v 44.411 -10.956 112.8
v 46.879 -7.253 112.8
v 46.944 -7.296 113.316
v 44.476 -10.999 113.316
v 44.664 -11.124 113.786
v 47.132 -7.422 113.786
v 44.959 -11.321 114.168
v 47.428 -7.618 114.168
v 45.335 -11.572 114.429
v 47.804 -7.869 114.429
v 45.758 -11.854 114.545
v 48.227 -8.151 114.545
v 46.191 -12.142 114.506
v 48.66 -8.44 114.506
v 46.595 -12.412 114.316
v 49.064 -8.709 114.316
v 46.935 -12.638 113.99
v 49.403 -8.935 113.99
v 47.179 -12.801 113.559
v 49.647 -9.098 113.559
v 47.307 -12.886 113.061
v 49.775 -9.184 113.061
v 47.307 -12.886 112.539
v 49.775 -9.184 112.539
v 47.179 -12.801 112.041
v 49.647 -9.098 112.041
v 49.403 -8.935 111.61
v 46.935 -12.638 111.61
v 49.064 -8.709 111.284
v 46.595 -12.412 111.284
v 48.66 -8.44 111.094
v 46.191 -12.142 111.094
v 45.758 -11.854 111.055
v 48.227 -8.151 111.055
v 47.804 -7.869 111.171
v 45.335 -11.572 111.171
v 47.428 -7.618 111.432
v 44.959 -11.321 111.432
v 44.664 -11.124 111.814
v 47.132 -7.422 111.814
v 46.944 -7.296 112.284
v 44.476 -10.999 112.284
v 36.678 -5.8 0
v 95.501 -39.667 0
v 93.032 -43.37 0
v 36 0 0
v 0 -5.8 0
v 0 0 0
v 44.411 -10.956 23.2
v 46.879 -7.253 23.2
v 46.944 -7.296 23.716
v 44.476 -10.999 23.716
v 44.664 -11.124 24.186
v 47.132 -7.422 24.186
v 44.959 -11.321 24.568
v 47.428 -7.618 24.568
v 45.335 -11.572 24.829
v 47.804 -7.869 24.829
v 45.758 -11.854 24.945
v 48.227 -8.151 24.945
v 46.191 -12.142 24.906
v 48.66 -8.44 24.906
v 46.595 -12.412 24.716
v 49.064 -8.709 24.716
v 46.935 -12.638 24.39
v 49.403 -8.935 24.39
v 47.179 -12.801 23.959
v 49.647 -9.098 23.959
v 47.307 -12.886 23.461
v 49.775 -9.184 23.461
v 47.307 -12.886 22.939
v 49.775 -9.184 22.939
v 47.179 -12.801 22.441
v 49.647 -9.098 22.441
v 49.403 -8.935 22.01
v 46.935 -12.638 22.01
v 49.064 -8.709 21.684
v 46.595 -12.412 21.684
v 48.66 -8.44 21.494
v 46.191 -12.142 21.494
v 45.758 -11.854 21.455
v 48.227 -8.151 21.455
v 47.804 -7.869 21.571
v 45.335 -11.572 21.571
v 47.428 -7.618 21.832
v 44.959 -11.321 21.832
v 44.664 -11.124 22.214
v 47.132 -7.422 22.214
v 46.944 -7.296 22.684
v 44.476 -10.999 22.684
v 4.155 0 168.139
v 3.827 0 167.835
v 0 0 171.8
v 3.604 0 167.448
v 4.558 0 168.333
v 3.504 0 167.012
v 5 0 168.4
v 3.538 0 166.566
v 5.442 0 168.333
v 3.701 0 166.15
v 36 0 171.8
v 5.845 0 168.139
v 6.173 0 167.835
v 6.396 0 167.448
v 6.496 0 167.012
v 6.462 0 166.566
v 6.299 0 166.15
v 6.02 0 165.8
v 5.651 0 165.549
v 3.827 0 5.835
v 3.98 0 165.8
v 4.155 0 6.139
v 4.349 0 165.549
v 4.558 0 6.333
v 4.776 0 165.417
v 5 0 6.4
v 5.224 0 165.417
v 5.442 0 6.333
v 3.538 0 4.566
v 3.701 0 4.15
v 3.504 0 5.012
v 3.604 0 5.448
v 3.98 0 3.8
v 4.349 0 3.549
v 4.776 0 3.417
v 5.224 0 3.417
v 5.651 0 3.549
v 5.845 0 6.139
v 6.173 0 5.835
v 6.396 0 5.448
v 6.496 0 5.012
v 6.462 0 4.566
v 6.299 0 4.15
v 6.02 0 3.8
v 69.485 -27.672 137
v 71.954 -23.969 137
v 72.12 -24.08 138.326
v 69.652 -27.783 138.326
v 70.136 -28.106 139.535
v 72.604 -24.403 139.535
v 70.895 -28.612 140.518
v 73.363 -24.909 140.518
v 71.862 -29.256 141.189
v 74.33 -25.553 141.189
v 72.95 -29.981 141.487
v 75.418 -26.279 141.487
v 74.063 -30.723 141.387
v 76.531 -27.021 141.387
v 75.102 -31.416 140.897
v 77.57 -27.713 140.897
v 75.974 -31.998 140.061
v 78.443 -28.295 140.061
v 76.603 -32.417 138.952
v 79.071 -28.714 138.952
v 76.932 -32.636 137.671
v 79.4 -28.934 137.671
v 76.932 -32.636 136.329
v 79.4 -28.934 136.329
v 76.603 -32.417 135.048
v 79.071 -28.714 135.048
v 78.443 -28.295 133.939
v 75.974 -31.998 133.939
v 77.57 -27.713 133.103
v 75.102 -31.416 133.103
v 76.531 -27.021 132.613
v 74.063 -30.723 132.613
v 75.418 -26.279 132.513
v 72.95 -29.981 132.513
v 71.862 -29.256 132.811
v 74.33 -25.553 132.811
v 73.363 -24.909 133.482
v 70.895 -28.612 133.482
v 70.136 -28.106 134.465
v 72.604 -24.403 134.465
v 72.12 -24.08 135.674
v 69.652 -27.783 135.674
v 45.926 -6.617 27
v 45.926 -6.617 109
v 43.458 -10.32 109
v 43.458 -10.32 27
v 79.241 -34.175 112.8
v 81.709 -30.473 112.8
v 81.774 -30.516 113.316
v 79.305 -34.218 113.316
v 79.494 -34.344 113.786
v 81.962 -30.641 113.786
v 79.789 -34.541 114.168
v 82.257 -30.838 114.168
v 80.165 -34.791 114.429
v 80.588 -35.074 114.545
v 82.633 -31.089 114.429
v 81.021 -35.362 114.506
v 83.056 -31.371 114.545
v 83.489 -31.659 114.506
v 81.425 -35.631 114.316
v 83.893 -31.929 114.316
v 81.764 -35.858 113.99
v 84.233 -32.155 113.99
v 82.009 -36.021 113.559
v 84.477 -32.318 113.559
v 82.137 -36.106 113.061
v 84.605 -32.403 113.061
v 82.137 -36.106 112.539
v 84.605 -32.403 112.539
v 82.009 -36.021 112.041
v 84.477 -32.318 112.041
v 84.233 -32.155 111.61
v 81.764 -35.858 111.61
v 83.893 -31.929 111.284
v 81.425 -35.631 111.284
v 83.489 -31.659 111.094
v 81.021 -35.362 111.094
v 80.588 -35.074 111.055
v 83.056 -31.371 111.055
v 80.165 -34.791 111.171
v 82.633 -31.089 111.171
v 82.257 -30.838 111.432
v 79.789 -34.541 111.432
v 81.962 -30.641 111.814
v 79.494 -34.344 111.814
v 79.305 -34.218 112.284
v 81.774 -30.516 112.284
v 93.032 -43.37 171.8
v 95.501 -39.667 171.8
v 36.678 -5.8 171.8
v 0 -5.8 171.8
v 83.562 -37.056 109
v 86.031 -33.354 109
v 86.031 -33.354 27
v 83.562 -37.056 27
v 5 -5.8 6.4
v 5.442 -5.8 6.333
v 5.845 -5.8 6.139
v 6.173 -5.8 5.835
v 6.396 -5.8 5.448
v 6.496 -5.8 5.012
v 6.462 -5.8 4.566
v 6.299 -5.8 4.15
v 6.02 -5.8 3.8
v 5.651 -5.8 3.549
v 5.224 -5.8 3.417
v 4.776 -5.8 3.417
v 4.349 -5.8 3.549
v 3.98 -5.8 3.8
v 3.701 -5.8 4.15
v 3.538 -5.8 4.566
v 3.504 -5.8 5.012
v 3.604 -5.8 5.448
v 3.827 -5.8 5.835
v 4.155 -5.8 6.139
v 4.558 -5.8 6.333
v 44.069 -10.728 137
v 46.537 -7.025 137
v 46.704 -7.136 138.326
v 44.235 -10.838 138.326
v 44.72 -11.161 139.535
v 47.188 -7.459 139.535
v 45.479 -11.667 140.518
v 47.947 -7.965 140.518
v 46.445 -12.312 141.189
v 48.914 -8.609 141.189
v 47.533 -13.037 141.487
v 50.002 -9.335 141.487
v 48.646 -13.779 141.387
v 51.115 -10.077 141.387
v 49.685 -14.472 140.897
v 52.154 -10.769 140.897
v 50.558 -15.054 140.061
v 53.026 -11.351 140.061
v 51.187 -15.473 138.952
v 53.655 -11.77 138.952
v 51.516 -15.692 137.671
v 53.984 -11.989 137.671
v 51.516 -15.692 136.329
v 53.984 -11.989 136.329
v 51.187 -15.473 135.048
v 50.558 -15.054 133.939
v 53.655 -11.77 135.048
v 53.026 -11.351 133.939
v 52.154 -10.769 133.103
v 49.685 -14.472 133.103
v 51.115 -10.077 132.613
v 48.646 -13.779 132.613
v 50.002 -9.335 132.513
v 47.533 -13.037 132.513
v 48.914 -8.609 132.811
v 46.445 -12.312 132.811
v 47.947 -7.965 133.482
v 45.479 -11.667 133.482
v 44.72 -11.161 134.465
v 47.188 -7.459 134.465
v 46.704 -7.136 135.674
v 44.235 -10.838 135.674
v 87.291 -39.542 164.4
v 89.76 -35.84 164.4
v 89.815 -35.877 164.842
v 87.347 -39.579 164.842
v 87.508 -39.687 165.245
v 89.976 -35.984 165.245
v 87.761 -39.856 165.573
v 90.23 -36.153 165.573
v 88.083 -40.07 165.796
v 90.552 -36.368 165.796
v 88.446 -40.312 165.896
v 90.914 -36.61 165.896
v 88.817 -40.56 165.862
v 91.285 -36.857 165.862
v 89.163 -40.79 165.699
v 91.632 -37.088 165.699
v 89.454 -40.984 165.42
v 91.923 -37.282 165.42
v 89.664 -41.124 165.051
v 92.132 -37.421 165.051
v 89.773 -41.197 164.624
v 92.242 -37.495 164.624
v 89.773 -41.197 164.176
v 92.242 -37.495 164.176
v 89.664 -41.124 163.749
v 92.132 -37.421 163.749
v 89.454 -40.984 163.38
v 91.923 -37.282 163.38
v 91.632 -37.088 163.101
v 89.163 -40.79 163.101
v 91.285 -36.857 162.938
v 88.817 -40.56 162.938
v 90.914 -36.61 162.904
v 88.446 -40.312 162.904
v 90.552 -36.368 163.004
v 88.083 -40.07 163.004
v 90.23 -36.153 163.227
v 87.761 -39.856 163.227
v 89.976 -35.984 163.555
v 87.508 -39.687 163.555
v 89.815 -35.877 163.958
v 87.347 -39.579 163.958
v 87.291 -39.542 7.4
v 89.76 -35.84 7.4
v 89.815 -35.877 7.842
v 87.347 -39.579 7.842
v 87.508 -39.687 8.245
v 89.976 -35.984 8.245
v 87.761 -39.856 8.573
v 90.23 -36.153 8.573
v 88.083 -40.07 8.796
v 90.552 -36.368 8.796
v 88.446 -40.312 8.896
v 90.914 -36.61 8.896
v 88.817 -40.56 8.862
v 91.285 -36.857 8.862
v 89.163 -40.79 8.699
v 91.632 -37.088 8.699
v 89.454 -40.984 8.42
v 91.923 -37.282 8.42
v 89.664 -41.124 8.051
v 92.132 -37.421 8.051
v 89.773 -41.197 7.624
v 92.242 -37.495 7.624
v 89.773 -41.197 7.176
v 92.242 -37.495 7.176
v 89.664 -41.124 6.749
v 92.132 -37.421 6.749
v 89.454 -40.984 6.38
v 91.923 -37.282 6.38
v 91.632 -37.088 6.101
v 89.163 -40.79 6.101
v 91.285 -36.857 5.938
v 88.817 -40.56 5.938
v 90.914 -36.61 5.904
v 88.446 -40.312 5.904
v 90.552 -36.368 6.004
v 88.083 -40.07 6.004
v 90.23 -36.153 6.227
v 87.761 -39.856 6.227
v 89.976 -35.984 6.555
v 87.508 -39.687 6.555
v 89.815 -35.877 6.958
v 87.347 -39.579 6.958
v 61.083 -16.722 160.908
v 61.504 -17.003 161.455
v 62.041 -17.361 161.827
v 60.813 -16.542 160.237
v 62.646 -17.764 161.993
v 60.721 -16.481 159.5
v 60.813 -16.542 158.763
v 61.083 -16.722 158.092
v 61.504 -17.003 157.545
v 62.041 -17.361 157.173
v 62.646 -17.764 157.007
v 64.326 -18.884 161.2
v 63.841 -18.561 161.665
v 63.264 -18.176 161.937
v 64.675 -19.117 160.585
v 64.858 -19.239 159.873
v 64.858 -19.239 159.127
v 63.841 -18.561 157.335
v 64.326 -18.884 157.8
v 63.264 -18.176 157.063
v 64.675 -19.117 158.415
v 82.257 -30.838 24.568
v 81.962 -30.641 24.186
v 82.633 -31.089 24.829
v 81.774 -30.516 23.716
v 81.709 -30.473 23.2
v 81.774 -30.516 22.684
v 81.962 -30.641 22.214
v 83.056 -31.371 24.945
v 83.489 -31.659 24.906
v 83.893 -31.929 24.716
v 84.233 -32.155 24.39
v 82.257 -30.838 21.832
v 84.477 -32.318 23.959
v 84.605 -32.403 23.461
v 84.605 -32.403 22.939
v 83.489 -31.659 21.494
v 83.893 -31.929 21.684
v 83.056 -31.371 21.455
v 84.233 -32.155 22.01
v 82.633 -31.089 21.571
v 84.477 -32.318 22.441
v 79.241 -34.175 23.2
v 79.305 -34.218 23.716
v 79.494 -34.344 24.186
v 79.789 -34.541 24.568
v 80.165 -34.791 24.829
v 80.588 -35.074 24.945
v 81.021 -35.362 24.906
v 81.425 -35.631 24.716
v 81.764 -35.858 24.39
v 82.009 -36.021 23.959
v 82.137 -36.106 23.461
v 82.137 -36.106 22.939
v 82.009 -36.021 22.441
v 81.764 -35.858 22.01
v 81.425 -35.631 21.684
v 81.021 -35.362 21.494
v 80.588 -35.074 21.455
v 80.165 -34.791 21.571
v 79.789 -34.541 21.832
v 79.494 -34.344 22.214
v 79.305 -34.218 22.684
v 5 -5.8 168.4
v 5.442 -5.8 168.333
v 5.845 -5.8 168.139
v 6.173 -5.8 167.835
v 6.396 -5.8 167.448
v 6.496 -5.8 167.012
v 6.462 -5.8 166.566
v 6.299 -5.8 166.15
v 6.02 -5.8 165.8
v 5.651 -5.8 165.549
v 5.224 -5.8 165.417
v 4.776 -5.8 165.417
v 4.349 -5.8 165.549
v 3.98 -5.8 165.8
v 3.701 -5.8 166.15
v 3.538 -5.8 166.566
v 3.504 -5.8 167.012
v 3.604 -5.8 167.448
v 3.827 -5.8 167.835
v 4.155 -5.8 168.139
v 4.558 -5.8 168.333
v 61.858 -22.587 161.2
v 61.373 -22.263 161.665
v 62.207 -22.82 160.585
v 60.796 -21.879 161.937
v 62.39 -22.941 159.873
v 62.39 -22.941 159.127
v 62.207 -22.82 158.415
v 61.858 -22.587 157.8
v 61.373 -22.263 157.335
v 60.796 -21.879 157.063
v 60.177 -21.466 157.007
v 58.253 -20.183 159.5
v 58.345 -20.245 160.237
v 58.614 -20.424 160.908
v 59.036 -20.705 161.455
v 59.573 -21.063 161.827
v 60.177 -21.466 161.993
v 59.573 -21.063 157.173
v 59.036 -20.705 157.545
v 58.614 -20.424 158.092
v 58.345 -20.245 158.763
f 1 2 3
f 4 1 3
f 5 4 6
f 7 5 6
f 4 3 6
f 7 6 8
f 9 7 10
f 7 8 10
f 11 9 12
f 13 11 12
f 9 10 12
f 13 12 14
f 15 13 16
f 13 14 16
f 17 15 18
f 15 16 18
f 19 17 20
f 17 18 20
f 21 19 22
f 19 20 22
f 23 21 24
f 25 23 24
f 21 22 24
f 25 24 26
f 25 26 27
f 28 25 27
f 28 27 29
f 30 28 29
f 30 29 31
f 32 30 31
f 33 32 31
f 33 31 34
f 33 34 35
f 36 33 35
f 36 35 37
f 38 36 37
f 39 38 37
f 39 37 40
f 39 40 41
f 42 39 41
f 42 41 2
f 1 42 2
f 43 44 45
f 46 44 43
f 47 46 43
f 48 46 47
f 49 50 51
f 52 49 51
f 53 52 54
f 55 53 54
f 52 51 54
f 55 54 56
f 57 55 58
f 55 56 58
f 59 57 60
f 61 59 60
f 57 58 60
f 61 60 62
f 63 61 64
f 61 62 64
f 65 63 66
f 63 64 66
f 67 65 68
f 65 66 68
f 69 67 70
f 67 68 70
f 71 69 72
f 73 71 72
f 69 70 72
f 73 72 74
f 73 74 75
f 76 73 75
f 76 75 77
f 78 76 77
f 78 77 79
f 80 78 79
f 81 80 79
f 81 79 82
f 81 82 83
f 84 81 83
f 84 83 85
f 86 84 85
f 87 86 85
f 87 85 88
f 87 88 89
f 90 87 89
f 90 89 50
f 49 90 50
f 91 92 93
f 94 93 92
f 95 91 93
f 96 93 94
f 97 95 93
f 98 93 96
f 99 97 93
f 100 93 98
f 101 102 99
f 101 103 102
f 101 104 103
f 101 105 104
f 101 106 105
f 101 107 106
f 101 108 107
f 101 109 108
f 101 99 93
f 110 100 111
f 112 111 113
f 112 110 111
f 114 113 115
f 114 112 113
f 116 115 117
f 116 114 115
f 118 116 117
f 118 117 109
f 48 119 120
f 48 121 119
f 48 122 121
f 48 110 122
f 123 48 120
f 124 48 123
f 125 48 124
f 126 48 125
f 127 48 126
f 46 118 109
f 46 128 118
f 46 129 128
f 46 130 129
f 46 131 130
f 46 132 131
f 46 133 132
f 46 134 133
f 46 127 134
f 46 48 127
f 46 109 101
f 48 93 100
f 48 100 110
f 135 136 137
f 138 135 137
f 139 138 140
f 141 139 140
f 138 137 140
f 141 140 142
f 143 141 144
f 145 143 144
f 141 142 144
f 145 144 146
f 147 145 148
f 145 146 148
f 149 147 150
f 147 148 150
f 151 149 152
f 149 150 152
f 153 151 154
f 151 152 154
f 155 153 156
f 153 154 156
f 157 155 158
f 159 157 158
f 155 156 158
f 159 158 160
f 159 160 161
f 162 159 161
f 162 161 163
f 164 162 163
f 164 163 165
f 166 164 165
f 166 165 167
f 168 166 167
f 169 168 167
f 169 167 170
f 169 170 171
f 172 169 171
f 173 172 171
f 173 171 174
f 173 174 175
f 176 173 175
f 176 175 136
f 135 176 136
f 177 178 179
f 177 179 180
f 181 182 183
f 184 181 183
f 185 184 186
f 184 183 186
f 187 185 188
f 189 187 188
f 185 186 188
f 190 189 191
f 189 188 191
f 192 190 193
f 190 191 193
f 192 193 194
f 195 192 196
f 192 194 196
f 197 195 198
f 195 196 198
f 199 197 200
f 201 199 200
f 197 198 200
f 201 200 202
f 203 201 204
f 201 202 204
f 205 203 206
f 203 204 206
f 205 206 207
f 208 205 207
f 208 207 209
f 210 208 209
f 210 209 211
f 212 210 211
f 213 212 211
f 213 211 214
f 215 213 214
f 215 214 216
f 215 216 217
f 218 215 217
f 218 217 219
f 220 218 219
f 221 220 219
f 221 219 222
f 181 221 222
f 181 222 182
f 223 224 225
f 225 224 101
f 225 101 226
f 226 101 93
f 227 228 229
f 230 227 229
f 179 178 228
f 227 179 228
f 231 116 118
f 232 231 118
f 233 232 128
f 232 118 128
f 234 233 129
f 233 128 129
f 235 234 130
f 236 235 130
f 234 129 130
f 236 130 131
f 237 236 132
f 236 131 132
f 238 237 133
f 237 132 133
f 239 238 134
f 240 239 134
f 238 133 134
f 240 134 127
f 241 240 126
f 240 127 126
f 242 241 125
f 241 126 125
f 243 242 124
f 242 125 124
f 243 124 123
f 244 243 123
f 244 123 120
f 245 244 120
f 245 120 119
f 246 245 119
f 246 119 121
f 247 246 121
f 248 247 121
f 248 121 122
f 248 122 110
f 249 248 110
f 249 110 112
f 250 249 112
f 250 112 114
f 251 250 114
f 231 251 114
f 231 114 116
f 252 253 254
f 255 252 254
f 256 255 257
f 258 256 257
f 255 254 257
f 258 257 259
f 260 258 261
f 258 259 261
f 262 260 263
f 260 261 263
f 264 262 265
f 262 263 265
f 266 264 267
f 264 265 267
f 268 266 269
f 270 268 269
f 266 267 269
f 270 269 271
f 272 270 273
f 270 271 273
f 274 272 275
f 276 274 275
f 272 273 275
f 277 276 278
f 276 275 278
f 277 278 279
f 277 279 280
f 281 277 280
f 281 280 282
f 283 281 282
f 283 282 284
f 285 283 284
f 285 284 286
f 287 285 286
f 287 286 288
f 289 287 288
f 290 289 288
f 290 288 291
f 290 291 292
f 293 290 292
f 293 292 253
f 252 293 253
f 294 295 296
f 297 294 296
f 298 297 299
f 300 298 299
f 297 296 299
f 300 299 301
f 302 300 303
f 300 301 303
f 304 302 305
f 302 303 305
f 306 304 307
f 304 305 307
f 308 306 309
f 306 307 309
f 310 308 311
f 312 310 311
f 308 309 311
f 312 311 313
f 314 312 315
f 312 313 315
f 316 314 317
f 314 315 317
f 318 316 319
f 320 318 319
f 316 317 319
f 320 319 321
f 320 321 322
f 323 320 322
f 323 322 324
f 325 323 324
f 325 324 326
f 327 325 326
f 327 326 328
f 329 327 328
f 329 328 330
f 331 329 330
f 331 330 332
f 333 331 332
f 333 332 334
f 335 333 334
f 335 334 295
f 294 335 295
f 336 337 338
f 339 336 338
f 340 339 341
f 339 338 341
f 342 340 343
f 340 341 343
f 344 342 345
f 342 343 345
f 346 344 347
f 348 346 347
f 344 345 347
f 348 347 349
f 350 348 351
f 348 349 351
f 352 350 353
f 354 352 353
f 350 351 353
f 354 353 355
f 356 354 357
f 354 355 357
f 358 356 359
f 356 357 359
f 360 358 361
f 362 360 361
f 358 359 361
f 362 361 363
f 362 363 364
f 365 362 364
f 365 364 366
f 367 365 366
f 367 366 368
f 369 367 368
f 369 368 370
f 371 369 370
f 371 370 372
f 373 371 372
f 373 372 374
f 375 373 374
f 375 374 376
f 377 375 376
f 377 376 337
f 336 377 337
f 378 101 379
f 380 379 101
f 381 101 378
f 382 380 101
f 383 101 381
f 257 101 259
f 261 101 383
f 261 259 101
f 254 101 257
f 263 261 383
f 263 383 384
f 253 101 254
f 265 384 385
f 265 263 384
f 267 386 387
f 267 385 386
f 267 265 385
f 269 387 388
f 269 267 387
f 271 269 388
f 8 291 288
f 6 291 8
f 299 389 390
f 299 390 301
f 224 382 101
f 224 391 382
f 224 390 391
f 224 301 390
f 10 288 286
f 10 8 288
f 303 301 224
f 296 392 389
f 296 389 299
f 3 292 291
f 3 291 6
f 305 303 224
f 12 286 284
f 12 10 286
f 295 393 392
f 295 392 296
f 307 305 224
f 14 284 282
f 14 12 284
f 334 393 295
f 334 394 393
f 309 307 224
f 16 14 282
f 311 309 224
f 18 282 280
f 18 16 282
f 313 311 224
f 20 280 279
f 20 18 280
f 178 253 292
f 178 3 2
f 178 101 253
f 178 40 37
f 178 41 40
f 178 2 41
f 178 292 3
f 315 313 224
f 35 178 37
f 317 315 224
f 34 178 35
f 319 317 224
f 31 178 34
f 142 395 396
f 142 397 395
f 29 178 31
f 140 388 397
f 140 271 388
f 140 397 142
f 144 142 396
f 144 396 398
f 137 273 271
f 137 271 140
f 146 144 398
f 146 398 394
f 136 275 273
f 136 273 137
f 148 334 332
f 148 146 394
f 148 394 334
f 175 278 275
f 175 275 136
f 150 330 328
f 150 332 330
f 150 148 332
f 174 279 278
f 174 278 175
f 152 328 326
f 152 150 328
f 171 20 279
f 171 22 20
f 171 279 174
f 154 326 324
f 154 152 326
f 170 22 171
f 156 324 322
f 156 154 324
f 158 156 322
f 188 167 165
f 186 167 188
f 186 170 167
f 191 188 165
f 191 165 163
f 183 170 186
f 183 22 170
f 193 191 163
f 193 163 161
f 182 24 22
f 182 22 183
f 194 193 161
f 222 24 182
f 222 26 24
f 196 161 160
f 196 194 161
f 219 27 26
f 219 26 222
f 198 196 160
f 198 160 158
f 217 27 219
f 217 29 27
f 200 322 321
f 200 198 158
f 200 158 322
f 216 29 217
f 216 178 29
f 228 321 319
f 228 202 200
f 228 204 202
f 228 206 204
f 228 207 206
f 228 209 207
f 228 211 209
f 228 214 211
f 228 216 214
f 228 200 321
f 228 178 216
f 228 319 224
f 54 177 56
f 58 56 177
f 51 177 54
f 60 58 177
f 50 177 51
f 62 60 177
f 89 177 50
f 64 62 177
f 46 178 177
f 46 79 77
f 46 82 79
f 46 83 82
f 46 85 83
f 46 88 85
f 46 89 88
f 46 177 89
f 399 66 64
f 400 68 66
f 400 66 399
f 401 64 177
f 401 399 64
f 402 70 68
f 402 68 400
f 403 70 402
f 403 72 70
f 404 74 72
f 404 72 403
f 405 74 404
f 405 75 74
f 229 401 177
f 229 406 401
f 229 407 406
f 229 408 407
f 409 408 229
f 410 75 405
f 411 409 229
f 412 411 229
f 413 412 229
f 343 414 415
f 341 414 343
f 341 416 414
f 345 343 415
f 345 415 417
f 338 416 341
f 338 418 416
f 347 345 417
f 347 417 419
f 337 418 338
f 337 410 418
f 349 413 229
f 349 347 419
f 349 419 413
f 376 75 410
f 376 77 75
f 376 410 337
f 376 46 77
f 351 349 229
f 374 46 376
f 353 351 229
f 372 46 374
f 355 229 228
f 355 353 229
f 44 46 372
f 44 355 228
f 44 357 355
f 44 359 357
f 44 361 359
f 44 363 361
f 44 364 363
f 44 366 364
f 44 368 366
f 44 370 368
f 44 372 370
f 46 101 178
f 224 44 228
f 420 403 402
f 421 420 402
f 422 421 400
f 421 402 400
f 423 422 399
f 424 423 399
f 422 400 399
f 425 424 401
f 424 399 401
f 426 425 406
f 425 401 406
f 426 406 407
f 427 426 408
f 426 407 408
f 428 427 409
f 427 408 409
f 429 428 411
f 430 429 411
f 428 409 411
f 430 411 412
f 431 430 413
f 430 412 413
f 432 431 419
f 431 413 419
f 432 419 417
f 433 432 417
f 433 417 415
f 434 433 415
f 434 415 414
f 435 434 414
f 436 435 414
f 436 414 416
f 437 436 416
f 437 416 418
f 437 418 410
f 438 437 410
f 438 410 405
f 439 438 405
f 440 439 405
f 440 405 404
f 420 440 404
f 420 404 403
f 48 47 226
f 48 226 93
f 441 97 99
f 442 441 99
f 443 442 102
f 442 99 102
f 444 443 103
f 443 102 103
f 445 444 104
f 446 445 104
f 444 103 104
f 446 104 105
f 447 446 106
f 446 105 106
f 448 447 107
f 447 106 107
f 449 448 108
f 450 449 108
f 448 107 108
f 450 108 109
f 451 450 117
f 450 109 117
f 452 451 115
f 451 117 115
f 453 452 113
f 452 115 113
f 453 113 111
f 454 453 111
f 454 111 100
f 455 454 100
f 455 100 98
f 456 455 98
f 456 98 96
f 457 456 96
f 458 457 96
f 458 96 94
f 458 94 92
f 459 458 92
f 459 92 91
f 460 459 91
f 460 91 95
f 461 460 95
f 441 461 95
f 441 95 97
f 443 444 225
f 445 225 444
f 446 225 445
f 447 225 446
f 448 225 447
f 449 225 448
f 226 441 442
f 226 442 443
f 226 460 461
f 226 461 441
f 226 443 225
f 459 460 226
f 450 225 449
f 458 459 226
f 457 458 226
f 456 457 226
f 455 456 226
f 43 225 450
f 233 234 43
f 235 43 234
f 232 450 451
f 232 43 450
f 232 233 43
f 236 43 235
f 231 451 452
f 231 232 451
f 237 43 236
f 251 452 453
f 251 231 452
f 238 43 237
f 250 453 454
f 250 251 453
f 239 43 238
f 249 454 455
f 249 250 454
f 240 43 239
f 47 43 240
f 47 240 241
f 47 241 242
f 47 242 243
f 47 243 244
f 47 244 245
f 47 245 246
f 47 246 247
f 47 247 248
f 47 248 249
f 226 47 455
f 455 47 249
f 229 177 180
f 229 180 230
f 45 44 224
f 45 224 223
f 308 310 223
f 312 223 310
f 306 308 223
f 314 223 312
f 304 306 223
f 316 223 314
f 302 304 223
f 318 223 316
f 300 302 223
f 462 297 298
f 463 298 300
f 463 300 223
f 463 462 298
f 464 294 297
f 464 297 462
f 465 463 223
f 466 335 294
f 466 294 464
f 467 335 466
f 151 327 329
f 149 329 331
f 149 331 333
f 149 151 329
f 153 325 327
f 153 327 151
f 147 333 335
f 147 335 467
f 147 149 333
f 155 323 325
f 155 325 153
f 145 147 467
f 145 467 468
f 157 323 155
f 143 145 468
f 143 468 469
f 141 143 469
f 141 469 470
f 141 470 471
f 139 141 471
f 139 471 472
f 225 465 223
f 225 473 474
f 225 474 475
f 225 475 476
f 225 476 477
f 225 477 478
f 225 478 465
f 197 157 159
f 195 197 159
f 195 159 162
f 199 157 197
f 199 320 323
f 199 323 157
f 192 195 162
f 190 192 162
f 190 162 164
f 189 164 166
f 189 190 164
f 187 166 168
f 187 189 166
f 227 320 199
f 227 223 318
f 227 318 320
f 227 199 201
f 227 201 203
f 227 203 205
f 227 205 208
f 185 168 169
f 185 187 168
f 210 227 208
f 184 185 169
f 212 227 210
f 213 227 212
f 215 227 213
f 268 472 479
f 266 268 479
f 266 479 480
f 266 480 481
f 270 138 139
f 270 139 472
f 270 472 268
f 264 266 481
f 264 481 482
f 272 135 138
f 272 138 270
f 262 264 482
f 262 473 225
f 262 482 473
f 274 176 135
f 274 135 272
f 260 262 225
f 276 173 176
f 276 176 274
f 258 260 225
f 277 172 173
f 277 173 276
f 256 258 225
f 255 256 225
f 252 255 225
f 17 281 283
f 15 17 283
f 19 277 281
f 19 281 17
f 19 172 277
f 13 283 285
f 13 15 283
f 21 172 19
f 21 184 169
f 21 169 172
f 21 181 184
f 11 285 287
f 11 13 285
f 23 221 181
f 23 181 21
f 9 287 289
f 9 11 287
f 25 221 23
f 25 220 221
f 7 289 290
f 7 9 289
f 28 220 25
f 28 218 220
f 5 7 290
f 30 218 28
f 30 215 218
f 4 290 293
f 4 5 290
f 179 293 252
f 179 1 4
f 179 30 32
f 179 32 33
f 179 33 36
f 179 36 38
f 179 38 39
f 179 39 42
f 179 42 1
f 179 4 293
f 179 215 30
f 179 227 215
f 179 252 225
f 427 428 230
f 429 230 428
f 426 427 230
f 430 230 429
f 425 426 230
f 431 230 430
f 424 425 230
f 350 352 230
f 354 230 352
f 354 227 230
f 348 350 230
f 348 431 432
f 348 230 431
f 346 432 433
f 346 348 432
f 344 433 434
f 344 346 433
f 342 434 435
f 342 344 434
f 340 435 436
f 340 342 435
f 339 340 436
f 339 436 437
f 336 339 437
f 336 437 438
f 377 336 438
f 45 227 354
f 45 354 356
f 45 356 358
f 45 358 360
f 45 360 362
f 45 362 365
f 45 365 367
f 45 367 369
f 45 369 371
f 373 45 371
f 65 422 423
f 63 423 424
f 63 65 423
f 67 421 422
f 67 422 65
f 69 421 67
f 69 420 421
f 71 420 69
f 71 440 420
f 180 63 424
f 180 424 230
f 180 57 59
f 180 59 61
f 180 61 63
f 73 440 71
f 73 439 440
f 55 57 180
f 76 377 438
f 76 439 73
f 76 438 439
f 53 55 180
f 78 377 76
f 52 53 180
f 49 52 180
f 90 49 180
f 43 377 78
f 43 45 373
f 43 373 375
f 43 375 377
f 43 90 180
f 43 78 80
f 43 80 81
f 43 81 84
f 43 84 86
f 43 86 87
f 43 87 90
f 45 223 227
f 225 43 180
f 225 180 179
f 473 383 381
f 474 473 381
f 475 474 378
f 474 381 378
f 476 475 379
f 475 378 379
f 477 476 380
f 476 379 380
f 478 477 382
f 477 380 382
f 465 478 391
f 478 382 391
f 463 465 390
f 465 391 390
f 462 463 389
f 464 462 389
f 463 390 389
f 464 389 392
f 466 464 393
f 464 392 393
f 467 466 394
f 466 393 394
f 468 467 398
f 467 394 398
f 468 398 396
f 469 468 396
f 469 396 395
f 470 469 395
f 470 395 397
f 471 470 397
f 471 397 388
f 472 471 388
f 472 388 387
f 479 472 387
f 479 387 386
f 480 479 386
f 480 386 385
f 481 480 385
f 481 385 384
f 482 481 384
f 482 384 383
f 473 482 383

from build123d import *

# Parameters (mm, degrees)
RESSALTO_EXTRUS_O1_DEPTH = 171.8
ESBO_O2_R                = 1.75
ESBO_O2_R_2              = 4.5
ESBO_O2_R_3              = 2.5
ESBO_O2_R_4              = 1.5
ESBO_O2_W                = 48.2
ESBO_O2_H                = 82
CORTE_EXTRUS_O1_DEPTH    = 91.8
ESBO_O3_R                = 1.5
CORTE_EXTRUS_O2_DEPTH    = 91.8


with BuildPart() as part:
    # Esboço1 → Ressalto-extrusão1 (new body)
    with BuildSketch(Plane.XY):
        Polygon((0, 0), (36, 0), (95.500769823, -39.667179882), (93.03235395, -43.369803692), (36.677648412, -5.8), (0, -5.8), align=None)
    extrude(amount=RESSALTO_EXTRUS_O1_DEPTH)

    # Esboço2 → Corte-extrusão1 (cut)
    with BuildSketch(Plane(origin=(11.076923077, 16.615384615, 0), x_dir=(0.8320502943378437, -0.5547001962252291, 0), z_dir=(0.5547001962252291, 0.8320502943378437, 0))):
        with Locations(Location((44.779323351, -112.8, 0), (0, 0, 180))):
            Circle(ESBO_O2_R)
        with Locations(Location((86.639323351, -112.8, 0), (0, 0, 180))):
            Circle(ESBO_O2_R)
        with Locations(Location((44.779323351, -23.2, 0), (0, 0, 180))):
            Circle(ESBO_O2_R)
        with Locations(Location((86.639323351, -23.2, 0), (0, 0, 180))):
            Circle(ESBO_O2_R)
        with Locations(Location((77.664836105, -137, 0), (0, 0, 180))):
            Circle(ESBO_O2_R_2)
        with Locations(Location((47.118170034, -137, 0), (0, 0, 180))):
            Circle(ESBO_O2_R_2)
        with Locations(Location((62.164836105, -159.5, 0), (0, 0, 180))):
            Circle(ESBO_O2_R_3)
        with Locations(Location((96.064836105, -164.4, 0), (0, 0, 180))):
            Circle(ESBO_O2_R_4)
        with Locations(Location((96.064836105, -7.4, 0), (0, 0, 180))):
            Circle(ESBO_O2_R_4)
        with Locations((65.983311741, -68)):
            Rectangle(ESBO_O2_W, ESBO_O2_H)
    extrude(amount=-CORTE_EXTRUS_O1_DEPTH, mode=Mode.SUBTRACT)

    # Esboço3 → Corte-extrusão2 (cut)
    with BuildSketch(Plane(origin=(0, 0, 0), x_dir=(1, 0, 0), z_dir=(0, 1, 0))):
        with Locations(Location((5, -166.9, 0), (0, 0, 270))):
            Circle(ESBO_O3_R)
        with Locations(Location((5, -4.9, 0), (0, 0, 270))):
            Circle(ESBO_O3_R)
    extrude(amount=-CORTE_EXTRUS_O2_DEPTH, mode=Mode.SUBTRACT)


solid = part.part
